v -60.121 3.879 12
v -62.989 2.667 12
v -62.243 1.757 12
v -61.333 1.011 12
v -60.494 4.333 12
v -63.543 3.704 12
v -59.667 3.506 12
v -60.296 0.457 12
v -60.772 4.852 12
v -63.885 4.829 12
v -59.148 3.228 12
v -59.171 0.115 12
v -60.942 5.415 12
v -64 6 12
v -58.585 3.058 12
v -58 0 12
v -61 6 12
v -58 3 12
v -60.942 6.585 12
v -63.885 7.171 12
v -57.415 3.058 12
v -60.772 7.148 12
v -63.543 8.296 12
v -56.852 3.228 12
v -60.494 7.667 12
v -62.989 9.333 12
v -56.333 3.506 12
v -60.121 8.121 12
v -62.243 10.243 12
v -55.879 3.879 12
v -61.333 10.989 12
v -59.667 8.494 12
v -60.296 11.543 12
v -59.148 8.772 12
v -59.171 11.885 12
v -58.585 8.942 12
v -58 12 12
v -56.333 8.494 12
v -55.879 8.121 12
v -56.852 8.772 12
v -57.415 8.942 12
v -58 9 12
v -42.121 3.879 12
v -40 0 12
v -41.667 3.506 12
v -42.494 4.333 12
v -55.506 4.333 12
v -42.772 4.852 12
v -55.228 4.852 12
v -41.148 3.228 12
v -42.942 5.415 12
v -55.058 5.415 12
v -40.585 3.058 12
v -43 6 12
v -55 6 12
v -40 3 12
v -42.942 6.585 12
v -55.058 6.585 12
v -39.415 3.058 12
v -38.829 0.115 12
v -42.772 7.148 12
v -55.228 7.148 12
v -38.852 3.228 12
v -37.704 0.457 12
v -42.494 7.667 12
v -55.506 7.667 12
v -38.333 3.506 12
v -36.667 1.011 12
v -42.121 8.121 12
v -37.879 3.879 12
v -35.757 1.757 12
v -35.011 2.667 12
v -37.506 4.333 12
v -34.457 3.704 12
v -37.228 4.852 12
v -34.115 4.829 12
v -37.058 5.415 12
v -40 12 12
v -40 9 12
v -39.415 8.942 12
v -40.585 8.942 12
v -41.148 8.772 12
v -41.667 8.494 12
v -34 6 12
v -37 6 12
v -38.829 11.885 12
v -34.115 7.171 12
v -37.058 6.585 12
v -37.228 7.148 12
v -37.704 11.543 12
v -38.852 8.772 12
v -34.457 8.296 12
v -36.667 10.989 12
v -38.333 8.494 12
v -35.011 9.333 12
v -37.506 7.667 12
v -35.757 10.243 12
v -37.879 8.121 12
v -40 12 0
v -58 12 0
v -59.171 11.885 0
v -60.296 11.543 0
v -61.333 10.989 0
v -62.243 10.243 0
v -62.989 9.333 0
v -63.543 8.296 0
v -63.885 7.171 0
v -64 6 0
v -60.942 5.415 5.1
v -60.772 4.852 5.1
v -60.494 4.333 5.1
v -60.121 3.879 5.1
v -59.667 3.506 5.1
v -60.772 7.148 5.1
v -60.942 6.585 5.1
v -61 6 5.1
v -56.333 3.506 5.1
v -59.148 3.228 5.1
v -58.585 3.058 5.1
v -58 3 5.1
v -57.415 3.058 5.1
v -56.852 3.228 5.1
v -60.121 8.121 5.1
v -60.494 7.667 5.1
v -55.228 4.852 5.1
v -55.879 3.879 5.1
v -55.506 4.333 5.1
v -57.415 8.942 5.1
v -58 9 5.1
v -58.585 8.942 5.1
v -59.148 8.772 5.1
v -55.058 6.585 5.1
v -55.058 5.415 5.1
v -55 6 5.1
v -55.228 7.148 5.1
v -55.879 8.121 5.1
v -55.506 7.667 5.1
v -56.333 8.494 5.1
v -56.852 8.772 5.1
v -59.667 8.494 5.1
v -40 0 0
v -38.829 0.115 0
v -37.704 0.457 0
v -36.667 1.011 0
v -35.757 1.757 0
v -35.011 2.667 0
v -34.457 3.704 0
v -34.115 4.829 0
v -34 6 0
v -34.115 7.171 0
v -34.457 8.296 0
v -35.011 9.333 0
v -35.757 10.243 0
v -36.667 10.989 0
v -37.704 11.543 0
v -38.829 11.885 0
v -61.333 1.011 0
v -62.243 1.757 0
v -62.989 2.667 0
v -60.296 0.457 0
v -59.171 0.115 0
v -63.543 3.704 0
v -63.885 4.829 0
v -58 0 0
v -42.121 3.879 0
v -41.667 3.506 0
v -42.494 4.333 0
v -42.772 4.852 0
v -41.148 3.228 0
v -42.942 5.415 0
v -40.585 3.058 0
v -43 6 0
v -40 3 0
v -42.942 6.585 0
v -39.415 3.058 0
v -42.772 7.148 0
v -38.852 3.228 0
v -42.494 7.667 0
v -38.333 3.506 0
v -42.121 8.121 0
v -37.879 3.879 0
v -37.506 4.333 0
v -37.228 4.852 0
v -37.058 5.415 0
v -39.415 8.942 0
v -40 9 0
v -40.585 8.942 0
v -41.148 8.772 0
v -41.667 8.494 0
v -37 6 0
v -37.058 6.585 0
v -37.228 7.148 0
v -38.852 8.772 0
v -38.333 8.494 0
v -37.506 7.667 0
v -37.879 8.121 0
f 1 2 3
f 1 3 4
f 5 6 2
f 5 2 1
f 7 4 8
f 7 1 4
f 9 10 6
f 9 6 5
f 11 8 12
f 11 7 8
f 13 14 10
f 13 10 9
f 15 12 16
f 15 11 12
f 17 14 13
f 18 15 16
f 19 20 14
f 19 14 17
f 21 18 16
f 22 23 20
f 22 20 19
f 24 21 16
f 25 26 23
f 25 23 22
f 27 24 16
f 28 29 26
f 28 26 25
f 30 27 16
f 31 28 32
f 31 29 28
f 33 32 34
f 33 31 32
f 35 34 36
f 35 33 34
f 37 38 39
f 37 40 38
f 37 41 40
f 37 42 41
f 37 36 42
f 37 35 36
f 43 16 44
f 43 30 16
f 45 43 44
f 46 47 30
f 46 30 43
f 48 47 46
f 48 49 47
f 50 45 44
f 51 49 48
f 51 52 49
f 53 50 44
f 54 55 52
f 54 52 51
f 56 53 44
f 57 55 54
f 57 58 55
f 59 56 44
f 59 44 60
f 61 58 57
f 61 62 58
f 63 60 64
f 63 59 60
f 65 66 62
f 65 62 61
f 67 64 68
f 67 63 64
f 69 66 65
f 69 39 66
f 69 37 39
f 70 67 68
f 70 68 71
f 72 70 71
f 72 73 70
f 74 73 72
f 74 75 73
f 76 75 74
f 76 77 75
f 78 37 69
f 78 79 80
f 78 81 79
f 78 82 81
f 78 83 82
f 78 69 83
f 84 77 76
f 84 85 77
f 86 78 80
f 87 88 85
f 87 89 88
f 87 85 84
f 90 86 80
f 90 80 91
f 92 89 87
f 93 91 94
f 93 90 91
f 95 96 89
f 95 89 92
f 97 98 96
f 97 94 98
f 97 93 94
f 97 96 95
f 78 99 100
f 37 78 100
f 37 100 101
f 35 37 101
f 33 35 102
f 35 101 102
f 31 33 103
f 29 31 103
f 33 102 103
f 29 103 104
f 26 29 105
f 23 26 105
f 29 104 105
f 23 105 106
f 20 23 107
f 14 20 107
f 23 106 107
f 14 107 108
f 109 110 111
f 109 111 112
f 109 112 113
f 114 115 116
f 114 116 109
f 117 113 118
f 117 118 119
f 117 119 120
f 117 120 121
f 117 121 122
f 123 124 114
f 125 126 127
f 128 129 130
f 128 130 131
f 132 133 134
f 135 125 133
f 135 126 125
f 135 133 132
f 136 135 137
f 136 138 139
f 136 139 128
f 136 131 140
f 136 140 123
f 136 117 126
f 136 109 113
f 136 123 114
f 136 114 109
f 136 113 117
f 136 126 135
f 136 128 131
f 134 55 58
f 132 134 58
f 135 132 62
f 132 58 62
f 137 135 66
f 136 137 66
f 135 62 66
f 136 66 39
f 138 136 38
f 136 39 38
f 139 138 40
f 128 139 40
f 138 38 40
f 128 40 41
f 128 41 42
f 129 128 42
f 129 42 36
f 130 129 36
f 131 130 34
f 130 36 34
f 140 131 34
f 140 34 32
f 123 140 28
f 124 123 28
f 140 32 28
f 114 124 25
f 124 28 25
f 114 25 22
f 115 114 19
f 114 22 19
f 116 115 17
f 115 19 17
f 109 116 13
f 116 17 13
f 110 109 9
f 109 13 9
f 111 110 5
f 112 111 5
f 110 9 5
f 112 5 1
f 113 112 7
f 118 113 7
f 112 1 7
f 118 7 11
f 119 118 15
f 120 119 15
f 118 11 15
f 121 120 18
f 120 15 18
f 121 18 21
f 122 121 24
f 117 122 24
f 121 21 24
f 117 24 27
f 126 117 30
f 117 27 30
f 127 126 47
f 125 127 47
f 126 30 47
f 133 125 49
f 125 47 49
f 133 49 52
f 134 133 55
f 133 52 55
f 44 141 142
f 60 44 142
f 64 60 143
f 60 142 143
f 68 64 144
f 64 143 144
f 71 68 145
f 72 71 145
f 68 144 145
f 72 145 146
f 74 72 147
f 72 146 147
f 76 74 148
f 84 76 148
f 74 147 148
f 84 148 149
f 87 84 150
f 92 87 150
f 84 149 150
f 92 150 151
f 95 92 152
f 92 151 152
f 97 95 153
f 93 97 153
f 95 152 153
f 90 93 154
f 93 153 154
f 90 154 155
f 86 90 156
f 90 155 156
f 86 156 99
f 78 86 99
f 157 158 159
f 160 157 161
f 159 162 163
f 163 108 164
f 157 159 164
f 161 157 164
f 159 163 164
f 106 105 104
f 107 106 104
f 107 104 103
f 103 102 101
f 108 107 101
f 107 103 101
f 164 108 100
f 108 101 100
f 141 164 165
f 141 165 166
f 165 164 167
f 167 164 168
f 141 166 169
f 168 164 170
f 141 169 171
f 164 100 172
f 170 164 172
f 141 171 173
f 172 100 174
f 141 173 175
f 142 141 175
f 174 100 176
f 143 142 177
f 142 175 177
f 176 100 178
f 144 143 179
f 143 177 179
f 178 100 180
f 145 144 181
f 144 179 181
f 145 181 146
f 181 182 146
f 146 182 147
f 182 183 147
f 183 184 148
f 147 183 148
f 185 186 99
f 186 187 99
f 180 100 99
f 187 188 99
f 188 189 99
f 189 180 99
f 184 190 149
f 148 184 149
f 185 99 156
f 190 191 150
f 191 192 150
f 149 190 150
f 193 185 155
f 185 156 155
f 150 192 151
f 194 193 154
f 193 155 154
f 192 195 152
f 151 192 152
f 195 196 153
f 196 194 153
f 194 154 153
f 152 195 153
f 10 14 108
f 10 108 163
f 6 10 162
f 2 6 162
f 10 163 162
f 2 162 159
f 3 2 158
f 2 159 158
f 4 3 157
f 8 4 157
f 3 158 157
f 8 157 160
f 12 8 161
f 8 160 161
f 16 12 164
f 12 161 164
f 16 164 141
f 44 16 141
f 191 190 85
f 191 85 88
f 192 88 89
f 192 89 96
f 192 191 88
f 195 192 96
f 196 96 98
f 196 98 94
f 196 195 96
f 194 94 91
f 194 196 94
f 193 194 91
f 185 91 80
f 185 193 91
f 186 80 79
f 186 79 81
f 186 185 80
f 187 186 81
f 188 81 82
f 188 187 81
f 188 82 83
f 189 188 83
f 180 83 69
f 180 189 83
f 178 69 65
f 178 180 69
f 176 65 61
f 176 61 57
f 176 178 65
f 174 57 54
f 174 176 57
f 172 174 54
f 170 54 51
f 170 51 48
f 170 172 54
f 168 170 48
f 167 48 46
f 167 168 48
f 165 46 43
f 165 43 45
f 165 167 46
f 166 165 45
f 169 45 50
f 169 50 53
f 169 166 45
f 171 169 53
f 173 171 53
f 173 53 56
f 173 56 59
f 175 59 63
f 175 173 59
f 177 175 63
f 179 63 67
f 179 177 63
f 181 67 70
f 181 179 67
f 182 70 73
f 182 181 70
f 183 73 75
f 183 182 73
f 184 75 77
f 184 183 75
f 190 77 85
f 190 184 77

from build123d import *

# Parameters (mm, degrees)
F0_R     = 3
F1_DEPTH = 12
F2_R     = 3
F3_DEPTH = 6.9


with BuildPart() as f1:
    # F0 (on Top) → F1 (new body)
    with BuildSketch(Plane.XY):
        with BuildLine():
            Line((-40, 12), (-58, 12))
            ThreePointArc((-58, 12), (-62.242641, 10.242641), (-64, 6))
            ThreePointArc((-64, 6), (-62.242641, 1.757359), (-58, 0))
            Line((-58, 0), (-40, 0))
            ThreePointArc((-40, 0), (-34, 6), (-40, 12))
        make_face()
        with Locations((-40, 6)):
            Circle(F0_R, mode=Mode.SUBTRACT)
    extrude(amount=F1_DEPTH)

    # F2 (on face) → F3 (cut)
    with BuildSketch(Plane.XY.offset(12)):
        with Locations((-58, 6)):
            Circle(F2_R)
    extrude(amount=-F3_DEPTH, mode=Mode.SUBTRACT)


solid = f1.part
